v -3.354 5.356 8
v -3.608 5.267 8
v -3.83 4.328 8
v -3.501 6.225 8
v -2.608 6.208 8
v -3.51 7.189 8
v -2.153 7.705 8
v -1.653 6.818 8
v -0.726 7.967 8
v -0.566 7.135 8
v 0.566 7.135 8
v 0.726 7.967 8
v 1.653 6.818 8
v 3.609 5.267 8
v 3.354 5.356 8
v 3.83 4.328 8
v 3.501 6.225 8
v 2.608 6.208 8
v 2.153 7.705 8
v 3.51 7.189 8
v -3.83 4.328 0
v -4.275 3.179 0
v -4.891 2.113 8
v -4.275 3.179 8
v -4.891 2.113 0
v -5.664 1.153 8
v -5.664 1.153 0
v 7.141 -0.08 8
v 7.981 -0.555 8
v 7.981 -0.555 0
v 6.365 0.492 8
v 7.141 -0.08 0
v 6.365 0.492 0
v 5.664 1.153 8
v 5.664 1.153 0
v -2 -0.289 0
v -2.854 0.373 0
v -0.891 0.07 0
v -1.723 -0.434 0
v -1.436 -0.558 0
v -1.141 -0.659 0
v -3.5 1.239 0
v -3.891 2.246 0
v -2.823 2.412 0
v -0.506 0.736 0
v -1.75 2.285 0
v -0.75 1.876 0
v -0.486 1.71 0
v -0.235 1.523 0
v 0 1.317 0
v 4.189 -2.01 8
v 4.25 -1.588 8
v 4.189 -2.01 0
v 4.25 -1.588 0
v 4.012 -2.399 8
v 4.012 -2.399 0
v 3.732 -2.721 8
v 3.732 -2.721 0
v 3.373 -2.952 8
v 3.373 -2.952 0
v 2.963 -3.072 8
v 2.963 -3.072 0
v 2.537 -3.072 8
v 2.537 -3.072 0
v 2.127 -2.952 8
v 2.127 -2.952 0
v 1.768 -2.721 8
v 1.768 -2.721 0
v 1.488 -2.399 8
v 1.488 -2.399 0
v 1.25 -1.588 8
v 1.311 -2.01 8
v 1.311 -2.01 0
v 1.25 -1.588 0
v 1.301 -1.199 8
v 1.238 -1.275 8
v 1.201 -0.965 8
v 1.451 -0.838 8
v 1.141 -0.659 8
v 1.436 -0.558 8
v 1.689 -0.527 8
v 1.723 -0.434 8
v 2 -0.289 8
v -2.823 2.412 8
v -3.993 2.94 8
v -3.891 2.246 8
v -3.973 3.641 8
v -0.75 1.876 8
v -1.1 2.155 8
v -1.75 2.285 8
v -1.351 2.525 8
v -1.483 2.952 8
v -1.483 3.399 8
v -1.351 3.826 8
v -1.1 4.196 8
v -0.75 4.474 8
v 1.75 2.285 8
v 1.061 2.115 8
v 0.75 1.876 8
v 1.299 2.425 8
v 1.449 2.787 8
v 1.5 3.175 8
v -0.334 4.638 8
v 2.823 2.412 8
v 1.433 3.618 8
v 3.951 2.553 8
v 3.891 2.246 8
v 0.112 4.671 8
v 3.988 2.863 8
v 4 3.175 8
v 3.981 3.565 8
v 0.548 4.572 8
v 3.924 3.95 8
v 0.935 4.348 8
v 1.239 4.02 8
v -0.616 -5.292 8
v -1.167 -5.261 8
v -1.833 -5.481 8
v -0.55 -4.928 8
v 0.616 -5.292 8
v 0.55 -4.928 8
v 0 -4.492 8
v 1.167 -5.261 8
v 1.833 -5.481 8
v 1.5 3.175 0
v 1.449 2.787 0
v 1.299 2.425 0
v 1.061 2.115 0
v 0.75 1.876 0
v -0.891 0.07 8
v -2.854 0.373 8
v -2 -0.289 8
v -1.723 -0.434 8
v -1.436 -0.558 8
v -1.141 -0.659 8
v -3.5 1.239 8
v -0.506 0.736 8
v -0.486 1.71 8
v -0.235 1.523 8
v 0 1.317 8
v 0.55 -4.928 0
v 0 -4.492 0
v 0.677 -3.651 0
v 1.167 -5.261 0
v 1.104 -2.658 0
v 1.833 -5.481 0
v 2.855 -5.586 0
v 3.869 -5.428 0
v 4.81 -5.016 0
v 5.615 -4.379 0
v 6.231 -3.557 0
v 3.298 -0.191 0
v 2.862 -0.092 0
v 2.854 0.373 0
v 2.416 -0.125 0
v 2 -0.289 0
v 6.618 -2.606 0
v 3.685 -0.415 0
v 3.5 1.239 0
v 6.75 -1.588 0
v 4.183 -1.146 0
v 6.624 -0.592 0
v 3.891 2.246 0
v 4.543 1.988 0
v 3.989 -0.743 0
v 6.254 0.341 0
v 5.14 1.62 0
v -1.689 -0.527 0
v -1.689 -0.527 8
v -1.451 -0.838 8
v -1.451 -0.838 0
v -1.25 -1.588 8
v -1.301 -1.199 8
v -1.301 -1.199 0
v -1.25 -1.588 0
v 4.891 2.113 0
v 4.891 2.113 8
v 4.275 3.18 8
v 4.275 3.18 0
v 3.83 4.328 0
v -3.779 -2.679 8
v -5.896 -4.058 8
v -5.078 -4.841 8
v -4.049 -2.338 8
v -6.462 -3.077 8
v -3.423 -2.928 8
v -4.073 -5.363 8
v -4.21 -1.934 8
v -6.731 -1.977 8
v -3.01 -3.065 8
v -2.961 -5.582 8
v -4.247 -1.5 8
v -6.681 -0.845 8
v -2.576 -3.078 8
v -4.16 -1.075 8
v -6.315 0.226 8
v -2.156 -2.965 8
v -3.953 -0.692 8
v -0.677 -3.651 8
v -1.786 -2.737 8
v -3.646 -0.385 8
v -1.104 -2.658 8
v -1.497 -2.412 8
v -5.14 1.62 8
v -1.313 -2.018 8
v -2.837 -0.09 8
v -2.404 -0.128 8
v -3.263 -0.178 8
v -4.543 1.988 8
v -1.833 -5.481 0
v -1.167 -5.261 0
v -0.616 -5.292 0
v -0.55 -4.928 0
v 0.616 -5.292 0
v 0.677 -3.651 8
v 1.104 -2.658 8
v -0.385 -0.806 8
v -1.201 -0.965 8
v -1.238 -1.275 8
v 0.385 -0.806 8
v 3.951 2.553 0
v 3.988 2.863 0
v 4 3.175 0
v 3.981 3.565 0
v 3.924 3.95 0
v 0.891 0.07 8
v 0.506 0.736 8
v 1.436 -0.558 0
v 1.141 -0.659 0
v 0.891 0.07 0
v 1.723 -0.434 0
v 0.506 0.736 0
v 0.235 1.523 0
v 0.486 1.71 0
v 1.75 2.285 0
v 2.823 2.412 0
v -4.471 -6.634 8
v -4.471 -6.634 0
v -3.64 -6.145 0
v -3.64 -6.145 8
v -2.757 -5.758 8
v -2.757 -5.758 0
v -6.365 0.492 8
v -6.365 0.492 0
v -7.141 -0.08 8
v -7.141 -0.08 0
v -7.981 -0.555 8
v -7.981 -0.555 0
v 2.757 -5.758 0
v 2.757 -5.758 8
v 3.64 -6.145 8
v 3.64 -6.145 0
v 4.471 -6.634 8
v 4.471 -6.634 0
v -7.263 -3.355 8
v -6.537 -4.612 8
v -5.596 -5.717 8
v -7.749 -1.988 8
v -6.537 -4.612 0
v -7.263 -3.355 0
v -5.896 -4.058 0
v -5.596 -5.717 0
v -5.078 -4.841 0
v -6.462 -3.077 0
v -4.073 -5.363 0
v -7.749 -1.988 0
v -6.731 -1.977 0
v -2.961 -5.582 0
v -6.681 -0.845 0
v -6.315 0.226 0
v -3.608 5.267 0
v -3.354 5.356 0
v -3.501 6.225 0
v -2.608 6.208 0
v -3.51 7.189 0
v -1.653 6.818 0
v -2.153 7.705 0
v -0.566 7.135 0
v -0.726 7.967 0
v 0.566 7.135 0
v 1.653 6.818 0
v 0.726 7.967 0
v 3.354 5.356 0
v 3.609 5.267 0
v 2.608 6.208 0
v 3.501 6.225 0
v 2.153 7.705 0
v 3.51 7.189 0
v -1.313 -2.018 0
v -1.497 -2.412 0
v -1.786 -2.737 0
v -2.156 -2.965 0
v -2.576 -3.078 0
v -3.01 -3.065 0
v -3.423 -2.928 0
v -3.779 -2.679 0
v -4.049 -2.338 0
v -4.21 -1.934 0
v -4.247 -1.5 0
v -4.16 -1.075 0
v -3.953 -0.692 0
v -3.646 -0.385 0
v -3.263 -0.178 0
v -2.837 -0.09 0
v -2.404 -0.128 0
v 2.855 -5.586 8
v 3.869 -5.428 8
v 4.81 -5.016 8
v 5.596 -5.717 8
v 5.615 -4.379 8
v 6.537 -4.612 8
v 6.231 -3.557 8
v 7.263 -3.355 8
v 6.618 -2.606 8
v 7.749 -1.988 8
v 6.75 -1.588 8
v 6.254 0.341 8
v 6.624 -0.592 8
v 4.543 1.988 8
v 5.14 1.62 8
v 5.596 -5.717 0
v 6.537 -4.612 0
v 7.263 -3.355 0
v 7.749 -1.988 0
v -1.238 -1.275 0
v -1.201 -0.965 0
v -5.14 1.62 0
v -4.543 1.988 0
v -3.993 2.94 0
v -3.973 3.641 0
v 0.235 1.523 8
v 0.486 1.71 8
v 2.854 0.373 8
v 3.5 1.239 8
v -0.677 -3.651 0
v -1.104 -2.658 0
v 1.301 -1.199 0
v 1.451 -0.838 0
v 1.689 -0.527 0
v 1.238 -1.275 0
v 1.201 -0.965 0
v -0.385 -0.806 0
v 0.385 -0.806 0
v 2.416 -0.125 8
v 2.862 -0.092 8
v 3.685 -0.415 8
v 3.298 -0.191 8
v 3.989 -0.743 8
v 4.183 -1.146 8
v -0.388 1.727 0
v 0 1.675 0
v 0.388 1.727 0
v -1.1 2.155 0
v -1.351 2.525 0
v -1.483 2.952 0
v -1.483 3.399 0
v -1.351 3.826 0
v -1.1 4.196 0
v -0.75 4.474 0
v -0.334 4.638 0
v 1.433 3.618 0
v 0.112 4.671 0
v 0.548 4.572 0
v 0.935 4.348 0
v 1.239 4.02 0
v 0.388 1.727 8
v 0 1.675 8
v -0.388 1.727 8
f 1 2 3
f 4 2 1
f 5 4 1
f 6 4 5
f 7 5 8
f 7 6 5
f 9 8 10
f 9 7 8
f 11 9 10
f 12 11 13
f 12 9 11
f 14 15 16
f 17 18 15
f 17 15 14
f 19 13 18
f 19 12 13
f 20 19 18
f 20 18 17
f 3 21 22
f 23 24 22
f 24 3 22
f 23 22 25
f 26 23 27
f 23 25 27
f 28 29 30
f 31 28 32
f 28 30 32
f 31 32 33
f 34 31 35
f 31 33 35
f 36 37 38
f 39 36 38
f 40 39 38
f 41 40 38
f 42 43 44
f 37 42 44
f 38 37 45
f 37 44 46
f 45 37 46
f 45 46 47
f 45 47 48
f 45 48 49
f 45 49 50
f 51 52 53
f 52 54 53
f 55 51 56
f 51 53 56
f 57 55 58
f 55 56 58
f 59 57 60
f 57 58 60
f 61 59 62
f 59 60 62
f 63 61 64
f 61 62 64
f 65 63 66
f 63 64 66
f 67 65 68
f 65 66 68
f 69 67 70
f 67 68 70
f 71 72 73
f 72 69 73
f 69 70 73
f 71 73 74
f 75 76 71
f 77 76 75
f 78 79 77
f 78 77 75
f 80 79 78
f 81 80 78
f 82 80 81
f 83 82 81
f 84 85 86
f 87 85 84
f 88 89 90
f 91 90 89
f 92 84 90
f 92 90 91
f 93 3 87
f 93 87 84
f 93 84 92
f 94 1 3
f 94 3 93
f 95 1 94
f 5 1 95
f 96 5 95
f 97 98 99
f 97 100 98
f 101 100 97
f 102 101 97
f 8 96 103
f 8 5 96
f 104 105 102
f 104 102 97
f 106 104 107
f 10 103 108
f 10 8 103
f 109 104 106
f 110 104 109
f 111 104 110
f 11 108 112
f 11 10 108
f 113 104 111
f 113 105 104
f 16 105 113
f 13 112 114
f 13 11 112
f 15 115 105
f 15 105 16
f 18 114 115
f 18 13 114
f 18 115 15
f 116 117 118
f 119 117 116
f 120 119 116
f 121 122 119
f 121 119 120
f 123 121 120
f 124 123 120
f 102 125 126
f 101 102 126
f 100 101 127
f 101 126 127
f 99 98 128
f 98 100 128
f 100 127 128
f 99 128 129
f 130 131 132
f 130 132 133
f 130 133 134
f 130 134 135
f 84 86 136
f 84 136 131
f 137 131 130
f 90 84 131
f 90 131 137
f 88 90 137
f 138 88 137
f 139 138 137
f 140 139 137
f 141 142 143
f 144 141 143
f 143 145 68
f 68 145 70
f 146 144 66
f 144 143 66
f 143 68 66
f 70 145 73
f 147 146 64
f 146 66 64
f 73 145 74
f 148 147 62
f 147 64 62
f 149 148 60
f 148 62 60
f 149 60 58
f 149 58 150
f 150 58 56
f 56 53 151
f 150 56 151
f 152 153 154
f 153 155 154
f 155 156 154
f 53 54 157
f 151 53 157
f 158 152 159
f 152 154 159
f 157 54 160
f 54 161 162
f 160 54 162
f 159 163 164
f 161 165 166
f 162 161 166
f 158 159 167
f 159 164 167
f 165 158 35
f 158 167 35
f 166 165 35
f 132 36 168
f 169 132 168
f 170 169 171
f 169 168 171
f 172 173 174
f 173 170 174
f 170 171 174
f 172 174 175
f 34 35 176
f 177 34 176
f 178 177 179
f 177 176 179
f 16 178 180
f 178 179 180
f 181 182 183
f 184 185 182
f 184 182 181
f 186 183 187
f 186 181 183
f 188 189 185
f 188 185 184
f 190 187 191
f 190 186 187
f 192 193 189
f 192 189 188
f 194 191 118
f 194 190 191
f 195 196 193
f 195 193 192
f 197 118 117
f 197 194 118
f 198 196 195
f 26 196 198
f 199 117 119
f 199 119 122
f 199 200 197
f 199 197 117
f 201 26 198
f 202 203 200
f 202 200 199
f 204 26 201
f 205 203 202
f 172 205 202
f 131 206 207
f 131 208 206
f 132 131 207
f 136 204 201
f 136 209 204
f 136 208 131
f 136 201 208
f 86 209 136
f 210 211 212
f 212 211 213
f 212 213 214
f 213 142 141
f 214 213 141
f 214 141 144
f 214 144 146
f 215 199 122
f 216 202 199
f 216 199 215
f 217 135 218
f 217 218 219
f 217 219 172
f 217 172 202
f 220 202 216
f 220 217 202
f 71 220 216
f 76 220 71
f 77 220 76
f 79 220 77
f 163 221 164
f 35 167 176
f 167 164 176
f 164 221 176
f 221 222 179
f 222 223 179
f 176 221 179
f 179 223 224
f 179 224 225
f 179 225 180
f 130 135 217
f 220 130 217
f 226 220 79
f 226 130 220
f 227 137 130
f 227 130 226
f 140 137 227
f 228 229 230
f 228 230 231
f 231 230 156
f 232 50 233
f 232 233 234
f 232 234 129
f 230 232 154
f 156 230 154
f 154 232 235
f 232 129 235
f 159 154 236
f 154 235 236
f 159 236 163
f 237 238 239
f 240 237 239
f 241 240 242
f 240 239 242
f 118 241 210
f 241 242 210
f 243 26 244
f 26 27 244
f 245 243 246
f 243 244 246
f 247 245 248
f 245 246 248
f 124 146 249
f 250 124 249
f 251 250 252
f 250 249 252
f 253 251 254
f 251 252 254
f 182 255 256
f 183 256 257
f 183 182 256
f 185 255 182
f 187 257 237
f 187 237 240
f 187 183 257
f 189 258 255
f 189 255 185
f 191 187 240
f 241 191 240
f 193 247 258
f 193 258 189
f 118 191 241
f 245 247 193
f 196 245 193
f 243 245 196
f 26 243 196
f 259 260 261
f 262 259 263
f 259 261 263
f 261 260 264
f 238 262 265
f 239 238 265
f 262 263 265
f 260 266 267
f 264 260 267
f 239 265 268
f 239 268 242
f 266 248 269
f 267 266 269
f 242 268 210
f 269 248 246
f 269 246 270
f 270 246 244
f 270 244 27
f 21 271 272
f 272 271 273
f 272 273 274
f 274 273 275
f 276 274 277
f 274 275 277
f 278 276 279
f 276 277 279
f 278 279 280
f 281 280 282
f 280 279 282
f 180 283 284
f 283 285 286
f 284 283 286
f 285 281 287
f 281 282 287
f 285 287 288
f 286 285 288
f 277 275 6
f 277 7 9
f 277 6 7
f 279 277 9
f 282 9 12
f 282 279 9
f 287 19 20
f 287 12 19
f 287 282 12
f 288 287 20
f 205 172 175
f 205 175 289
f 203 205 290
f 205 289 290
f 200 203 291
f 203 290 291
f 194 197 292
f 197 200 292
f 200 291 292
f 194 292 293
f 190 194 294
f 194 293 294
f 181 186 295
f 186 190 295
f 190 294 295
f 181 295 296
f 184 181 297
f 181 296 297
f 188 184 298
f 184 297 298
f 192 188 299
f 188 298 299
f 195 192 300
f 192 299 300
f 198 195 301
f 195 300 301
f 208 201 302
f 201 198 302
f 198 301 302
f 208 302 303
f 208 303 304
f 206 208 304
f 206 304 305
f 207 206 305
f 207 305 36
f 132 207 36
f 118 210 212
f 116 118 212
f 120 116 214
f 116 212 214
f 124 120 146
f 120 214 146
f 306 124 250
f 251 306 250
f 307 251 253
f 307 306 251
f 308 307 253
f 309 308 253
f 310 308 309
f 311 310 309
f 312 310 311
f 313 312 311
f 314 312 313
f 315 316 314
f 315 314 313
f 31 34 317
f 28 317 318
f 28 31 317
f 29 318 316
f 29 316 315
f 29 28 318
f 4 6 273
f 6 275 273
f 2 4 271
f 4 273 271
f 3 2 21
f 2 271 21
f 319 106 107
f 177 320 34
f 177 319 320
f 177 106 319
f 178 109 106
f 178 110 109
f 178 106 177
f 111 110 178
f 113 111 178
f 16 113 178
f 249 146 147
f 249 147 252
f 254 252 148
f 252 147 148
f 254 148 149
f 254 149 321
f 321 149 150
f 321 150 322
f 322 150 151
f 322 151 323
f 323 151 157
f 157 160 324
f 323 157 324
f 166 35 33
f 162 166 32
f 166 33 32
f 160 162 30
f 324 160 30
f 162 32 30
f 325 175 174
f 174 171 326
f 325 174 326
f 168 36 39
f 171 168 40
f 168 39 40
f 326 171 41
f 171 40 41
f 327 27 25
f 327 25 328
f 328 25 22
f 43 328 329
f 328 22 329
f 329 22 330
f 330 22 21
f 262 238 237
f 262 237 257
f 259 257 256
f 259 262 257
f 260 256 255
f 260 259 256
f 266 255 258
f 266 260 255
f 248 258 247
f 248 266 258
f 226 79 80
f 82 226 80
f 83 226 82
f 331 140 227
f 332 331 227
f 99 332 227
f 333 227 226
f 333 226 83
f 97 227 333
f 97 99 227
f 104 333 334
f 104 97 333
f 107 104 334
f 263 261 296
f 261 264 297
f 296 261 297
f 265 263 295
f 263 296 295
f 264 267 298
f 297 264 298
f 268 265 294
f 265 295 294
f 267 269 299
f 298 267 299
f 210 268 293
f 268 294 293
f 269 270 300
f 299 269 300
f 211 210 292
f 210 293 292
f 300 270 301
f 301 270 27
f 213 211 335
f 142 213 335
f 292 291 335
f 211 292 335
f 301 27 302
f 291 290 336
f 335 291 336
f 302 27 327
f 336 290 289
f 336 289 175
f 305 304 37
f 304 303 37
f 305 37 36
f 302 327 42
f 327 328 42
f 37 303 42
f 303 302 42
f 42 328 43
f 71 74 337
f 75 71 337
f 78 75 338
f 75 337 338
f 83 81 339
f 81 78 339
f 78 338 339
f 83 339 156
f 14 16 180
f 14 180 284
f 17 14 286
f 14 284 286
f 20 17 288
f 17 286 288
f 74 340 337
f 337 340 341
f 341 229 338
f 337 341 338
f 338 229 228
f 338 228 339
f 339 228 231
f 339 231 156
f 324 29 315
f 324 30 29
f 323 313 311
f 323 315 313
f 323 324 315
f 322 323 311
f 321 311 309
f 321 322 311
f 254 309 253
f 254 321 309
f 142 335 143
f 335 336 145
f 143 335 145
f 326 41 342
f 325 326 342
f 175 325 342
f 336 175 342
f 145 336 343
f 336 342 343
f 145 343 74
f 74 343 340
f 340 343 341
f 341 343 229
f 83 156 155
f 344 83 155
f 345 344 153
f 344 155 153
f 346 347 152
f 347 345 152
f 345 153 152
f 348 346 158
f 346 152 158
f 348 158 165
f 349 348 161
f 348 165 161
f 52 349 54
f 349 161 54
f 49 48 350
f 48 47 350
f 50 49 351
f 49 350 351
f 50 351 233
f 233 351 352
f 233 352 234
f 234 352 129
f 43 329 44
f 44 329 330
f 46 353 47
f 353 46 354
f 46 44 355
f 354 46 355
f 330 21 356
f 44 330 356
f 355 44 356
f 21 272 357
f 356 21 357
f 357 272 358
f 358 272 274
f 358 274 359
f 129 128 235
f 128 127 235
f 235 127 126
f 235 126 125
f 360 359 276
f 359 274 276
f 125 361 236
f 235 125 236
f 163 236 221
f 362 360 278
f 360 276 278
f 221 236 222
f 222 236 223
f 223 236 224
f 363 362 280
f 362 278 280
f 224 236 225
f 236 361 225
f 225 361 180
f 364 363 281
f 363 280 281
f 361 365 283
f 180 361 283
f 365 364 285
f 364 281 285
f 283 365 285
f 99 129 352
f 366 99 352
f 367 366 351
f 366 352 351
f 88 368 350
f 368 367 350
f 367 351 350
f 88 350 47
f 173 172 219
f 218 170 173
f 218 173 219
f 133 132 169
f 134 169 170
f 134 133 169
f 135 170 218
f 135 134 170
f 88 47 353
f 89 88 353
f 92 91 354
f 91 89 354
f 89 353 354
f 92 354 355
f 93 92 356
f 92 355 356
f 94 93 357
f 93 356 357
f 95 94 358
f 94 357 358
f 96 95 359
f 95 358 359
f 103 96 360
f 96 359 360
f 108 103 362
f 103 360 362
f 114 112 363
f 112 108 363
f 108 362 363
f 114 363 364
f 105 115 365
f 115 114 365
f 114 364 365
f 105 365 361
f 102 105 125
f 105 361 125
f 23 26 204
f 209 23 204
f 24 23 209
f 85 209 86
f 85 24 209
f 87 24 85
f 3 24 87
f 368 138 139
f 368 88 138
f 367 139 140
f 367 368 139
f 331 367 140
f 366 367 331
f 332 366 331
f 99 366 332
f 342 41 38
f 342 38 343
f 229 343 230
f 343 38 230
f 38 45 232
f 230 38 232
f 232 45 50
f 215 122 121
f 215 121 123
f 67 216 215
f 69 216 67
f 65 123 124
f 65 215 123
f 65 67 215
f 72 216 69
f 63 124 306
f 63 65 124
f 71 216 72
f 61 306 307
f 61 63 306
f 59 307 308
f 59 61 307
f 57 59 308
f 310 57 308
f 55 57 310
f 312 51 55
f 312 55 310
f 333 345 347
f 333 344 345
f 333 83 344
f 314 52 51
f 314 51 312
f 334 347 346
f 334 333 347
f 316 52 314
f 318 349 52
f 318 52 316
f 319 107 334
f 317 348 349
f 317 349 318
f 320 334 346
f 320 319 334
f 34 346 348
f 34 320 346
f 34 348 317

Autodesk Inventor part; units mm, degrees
ref_plane "YZ Plane" through (0, 0, 0) normal (1, 0, 0) x (0, 1, 0)
ref_plane "XZ Plane" through (0, 0, 0) normal (0, 1, 0) x (-1, 0, 0)
ref_plane "XY Plane" through (0, 0, 0) normal (0, 0, 1) x (1, 0, 0)
sketch "スケッチ1" plane through (0, 0, 0) normal (0, 0, 1) x (1, 0, 0)
  circle A0 centre (0, 0) radius 8
  line L0 (0, 3.1754) -> (2.75, -1.5877) construction
  line L1 (2.75, -1.5877) -> (-2.75, -1.5877) construction
  line L2 (-2.75, -1.5877) -> (0, 3.1754) construction
  circle A1 centre (0, 3.1754) radius 1.5
  circle A2 centre (2.75, -1.5877) radius 1.5
  circle A3 centre (-2.75, -1.5877) radius 1.5
  circle A4 centre (0, 3.1754) radius 4
  circle A5 centre (2.75, -1.5877) radius 4
  circle A6 centre (-2.75, -1.5877) radius 4
  arc A7 (-7.9807, -0.5547) -> (-3.51, 7.1889) centre (-11.4907, 6.6342) ccw
  arc A8 (3.51, 7.1889) -> (7.9807, -0.5547) centre (11.4907, 6.6342) ccw
  arc A9 (4.4708, -6.6342) -> (-4.4708, -6.6342) centre (0, -13.2684) ccw
  dimension "d0" = 16
  dimension "d1" = 5.5
  dimension "d2" = 3
  dimension "d3" = 3
  dimension "d4" = 3
  dimension "d5" = 2.5
  dimension "d6" = 2.5
  dimension "d7" = 2.5
  dimension "d8" = 8
  dimension "d9" = 8
  dimension "d10" = 8
extrude "押し出し1" add sketch "スケッチ1" along normal blind 8 contours A8 A4 A7 A0 | A0 A9 A5 A8 | A8 A5 A4 | A4 A5 A1 A6 | A5 A6 A2 A4 | A7 A6 A9 A0 | A4 A6 A7 | A9 A6 A5 | A4 A6 A5 | A6 A4 A3 A5 | A6 A5 A4 | A5 A4 A6 | A2 A6 A4 | A5 A6 A1 | A4 A5 A3 | A4 A5 A6
